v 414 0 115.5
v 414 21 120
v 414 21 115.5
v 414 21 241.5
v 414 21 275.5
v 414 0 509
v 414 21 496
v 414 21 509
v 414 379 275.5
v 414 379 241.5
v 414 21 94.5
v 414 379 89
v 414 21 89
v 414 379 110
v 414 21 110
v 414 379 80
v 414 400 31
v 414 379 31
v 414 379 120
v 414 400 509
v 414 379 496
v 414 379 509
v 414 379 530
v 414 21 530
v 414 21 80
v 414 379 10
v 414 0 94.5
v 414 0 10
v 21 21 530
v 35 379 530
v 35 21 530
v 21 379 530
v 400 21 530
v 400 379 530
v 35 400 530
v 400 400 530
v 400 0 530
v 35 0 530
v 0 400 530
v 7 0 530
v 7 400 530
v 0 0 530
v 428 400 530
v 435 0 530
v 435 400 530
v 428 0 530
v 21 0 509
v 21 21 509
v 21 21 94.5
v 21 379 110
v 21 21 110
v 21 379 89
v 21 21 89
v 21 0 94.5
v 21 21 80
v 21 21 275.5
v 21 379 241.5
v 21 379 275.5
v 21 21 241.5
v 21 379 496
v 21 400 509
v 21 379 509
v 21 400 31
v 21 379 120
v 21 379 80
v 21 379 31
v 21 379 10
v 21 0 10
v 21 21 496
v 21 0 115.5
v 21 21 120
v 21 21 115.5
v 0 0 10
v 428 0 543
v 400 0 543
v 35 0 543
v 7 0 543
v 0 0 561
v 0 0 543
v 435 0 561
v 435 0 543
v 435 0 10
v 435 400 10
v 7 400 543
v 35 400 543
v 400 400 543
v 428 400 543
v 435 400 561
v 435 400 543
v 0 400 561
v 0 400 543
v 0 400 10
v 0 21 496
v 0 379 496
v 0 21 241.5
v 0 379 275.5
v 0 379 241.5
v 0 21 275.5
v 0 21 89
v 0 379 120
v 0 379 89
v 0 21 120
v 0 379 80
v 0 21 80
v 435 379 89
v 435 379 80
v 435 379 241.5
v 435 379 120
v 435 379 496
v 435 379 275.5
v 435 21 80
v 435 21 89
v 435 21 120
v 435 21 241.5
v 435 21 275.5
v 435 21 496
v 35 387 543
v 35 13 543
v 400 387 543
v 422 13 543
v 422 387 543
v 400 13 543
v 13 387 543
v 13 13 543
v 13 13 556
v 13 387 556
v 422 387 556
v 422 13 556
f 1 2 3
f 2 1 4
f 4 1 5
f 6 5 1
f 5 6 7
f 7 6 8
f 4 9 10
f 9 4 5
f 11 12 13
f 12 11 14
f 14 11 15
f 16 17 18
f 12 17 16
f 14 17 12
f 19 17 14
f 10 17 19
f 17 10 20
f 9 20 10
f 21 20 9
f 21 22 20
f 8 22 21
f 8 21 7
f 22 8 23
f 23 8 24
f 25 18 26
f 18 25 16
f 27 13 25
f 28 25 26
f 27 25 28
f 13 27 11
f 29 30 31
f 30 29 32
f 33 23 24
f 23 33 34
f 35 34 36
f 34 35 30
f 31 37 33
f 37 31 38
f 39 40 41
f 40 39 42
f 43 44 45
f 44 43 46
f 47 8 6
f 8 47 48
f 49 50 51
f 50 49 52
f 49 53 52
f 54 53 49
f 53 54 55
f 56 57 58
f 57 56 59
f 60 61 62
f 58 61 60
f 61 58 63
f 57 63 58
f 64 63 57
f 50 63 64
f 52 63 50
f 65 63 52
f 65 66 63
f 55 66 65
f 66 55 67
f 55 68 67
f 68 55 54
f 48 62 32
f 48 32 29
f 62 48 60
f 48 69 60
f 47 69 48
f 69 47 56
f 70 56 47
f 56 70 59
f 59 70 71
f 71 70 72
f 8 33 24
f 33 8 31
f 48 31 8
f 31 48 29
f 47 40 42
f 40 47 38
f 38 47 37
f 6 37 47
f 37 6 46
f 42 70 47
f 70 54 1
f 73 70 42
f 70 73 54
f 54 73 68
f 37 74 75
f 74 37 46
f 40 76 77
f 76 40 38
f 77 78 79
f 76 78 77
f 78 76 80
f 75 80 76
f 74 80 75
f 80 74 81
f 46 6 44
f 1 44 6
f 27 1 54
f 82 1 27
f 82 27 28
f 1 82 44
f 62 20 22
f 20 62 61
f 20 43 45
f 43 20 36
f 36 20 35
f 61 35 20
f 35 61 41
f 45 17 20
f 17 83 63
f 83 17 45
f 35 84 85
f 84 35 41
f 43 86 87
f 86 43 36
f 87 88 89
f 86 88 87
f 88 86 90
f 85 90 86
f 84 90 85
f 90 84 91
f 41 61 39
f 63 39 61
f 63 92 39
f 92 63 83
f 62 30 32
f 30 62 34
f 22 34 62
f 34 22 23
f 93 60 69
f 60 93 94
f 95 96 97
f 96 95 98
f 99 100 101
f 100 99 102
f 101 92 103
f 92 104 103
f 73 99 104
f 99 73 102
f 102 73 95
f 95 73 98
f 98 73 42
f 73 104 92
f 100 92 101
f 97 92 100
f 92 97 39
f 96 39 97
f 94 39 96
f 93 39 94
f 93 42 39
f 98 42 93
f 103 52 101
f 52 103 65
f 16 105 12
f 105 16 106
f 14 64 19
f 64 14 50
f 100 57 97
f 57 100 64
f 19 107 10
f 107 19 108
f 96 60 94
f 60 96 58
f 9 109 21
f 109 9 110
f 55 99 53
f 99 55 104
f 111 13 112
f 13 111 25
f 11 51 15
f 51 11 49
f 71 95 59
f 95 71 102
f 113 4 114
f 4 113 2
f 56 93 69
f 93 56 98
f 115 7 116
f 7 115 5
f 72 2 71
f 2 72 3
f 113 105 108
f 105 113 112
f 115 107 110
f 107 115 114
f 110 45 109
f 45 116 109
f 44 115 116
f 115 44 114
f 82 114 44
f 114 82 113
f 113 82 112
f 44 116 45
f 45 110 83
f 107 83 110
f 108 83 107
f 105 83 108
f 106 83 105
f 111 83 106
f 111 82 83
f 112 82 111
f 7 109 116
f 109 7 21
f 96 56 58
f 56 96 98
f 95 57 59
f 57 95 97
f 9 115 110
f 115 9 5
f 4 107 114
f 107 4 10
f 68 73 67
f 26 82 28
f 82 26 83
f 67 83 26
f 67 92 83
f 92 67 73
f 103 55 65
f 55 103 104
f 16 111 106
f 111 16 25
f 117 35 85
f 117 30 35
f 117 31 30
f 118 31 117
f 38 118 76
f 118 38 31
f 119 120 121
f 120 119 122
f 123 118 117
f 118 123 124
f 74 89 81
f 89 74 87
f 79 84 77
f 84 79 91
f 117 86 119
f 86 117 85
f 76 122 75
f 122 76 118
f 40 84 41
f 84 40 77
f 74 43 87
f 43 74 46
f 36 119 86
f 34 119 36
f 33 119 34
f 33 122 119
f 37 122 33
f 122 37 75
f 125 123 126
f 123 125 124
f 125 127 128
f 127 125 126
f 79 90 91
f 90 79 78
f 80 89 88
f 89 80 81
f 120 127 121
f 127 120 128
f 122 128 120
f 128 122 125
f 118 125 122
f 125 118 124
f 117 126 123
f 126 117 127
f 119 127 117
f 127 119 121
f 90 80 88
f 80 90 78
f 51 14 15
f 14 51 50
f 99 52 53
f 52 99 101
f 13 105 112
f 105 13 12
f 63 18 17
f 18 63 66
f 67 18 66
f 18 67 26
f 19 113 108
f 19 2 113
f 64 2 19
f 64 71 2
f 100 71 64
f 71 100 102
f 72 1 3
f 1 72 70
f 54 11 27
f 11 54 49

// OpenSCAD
//ecran 15" 4/3 = 229mm x 305mm
//plus cadre ~~ 260x335

//ecran 15" 16/9 = 187mm x 332mm
//plus cadre ~~ 210x360
//ok

l_e=379; // largeur ext écran mm
jeu= 7;//jeu de chaque coté mm

pp= 400; // profondeur caisse mm

t1=21; // largeur tasseau 1 (carre)
t1l=21;

t2=13;

p1l=28; //l planche1
p1h=13;//h planche1

p2h=21;//h planche1
p2l=34; //l planche1

t3=21;
t3l=70;

ll=l_e+2*jeu+2*t1; //largeur ext structure
echo("ll",ll);


ee=10; //epaisseur plateau milieu

ee_couv=5;

jj=400;
kk=120; // hteur dessous
hh=jj+kk; // hteur
hh2=hh+p1h+t1+ee+ee; //

echo("hh2",hh2);

ii=5; //e. placage

*color("grey") cube([ll,pp,ee]);


color("plum") {
    translate([0,0,hh-t1l+ee]){
        translate([t1,0,0])
        cube([ll-2*t1,t1,t1l]);
        translate([t1,pp-t1,0])
        cube([ll-2*t1,t1,t1l]);
    }}
color("magenta") {
    translate([0,0,hh-t1+ee]){
        translate([0,t1l,t1-p2l])
        cube([p2h,pp-2*t1l,p2l]);
        translate([ll-t1,t1l,t1-p2l])
        cube([p2h,pp-2*t1l,p2l]);
    }}

// pour les poignées si assez leger
color("magenta") {
    translate([0,0,(hh-t1+ee)/2]){
        translate([0,t1l,t1-p2l])
        cube([p2h,pp-2*t1l,p2l]);
        translate([ll-t1,t1l,t1-p2l])
        cube([p2h,pp-2*t1l,p2l]);
    }}

color("green") {
    translate([0,0,ee]){
        translate([0,0,0])
        cube([t1,t1l,hh]);
        translate([ll-t1,0,0])
        cube([t1,t1l,hh]);
        translate([0,pp-t1l,0])
        cube([t1,t1l,hh]);
        translate([ll-t1,pp-t1l,0])
        cube([t1,t1l,hh]);
    }}
color("magenta") {
    translate([0,0,ee]){
        translate([0,t1l,0])
        cube([t3,pp-2*t1l,t3l]);
        translate([ll-t1,t1l,0])
        cube([t3,pp-2*t1l,t3l]);
    }}
color("plum") {
    translate([0,0,ee]){
        translate([t1,pp-t1,0])
        cube([ll-2*t1,t1,t1l]);
    }}
// planches sur le cadre

color("orange"){
    translate([0,0,hh+ee]){
        translate([jeu,0,0])
        cube([p1l,pp,p1h]);
        translate([ll-p1l-jeu,0,0])
        cube([p1l,pp,p1h]);
    }}
// couvercle

color("yellow",0.6) {
    translate([0,0,hh+ee+p1h]){
        translate([0,0,0])
        cube([t2,pp,t2]);
        translate([ll-t2,0,0])
        cube([t2,pp,t2]);
        translate([t2,0,0])
        cube([ll-2*t2,t2,t2]);
        translate([t2,pp-t2,0])
        cube([ll-2*t2,t2,t2]);
        translate([0,0,t2])
        cube([ll,pp,ee_couv]);
    }}

//middle
color("plum") {
    translate([0,0,kk-t1l-ee]){
        translate([0,t1l,0])
        cube([t1,pp-2*t1l,t1l]);
        translate([ll-t1,t1l,0])
        cube([t1,pp-2*t1l,t1l]);
    }}
color("grey",0.7){
    translate([0,0,kk-p2l-ee]){
        union(){
    //    translate([t1,0,p2l])
    //    cube([ll-2*t1,pp,ee]);
            translate([0,t1,p2l])
            cube([ll,pp-2*t1,ee]);
    }}}
color("blue",0.8) {
    translate([0,0,kk-p2l-ee-ee]){
        translate([t1,0,p2l+ee/2-t1/2])
        cube([ll-2*t1,t1,t1]);
    }}

// placage
*color("tan",0.8){
    translate([-ii,0,0])
    cube([ii,pp,hh2]);
    translate([ll,0,0])
    cube([ii,pp,hh2]);
}
//arriere
*translate([-ii,pp,0])
color("pink") cube([ll+2*ii,ii,hh2]);

//tiroir
{
e_coulisse=10;
p_coulisse=350;
h_coulisse=10;
h_ss_plancher=10;
*color("red",0.8){
    translate([t1+e_coulisse,0,ee+h_coulisse])
    cube([ll-2*t1-2*e_coulisse,p_coulisse,kk-3*ee-h_coulisse-h_ss_plancher]);
    translate([-ii,-ii,0])
    cube([ll+2*ii,ii,kk-2*ee-h_ss_plancher]);
}
}

//devant
{
color("pink")
*union(){
    h_cache=60;
    translate([-ii,-ii,hh-h_cache])
    cube([ll+2*ii,ii,h_cache-hh+hh2]);
    //devant bas
    h_cache_b=20;
    translate([-ii,-ii,kk-2*ee-h_ss_plancher])
    cube([ll+2*ii,ii,h_cache_b-hh+hh2]);
    //
    cote=25;
    translate([-ii,-ii,kk-2*ee-h_ss_plancher+h_cache_b-hh+hh2])
    cube([cote+ii,ii,jj-h_cache+hh-hh2+ii]);
    translate([ll-cote,-ii,kk-2*ee-h_ss_plancher+h_cache_b-hh+hh2])
    cube([cote+ii,ii,jj-h_cache+hh-hh2+ii]);
    }
}
